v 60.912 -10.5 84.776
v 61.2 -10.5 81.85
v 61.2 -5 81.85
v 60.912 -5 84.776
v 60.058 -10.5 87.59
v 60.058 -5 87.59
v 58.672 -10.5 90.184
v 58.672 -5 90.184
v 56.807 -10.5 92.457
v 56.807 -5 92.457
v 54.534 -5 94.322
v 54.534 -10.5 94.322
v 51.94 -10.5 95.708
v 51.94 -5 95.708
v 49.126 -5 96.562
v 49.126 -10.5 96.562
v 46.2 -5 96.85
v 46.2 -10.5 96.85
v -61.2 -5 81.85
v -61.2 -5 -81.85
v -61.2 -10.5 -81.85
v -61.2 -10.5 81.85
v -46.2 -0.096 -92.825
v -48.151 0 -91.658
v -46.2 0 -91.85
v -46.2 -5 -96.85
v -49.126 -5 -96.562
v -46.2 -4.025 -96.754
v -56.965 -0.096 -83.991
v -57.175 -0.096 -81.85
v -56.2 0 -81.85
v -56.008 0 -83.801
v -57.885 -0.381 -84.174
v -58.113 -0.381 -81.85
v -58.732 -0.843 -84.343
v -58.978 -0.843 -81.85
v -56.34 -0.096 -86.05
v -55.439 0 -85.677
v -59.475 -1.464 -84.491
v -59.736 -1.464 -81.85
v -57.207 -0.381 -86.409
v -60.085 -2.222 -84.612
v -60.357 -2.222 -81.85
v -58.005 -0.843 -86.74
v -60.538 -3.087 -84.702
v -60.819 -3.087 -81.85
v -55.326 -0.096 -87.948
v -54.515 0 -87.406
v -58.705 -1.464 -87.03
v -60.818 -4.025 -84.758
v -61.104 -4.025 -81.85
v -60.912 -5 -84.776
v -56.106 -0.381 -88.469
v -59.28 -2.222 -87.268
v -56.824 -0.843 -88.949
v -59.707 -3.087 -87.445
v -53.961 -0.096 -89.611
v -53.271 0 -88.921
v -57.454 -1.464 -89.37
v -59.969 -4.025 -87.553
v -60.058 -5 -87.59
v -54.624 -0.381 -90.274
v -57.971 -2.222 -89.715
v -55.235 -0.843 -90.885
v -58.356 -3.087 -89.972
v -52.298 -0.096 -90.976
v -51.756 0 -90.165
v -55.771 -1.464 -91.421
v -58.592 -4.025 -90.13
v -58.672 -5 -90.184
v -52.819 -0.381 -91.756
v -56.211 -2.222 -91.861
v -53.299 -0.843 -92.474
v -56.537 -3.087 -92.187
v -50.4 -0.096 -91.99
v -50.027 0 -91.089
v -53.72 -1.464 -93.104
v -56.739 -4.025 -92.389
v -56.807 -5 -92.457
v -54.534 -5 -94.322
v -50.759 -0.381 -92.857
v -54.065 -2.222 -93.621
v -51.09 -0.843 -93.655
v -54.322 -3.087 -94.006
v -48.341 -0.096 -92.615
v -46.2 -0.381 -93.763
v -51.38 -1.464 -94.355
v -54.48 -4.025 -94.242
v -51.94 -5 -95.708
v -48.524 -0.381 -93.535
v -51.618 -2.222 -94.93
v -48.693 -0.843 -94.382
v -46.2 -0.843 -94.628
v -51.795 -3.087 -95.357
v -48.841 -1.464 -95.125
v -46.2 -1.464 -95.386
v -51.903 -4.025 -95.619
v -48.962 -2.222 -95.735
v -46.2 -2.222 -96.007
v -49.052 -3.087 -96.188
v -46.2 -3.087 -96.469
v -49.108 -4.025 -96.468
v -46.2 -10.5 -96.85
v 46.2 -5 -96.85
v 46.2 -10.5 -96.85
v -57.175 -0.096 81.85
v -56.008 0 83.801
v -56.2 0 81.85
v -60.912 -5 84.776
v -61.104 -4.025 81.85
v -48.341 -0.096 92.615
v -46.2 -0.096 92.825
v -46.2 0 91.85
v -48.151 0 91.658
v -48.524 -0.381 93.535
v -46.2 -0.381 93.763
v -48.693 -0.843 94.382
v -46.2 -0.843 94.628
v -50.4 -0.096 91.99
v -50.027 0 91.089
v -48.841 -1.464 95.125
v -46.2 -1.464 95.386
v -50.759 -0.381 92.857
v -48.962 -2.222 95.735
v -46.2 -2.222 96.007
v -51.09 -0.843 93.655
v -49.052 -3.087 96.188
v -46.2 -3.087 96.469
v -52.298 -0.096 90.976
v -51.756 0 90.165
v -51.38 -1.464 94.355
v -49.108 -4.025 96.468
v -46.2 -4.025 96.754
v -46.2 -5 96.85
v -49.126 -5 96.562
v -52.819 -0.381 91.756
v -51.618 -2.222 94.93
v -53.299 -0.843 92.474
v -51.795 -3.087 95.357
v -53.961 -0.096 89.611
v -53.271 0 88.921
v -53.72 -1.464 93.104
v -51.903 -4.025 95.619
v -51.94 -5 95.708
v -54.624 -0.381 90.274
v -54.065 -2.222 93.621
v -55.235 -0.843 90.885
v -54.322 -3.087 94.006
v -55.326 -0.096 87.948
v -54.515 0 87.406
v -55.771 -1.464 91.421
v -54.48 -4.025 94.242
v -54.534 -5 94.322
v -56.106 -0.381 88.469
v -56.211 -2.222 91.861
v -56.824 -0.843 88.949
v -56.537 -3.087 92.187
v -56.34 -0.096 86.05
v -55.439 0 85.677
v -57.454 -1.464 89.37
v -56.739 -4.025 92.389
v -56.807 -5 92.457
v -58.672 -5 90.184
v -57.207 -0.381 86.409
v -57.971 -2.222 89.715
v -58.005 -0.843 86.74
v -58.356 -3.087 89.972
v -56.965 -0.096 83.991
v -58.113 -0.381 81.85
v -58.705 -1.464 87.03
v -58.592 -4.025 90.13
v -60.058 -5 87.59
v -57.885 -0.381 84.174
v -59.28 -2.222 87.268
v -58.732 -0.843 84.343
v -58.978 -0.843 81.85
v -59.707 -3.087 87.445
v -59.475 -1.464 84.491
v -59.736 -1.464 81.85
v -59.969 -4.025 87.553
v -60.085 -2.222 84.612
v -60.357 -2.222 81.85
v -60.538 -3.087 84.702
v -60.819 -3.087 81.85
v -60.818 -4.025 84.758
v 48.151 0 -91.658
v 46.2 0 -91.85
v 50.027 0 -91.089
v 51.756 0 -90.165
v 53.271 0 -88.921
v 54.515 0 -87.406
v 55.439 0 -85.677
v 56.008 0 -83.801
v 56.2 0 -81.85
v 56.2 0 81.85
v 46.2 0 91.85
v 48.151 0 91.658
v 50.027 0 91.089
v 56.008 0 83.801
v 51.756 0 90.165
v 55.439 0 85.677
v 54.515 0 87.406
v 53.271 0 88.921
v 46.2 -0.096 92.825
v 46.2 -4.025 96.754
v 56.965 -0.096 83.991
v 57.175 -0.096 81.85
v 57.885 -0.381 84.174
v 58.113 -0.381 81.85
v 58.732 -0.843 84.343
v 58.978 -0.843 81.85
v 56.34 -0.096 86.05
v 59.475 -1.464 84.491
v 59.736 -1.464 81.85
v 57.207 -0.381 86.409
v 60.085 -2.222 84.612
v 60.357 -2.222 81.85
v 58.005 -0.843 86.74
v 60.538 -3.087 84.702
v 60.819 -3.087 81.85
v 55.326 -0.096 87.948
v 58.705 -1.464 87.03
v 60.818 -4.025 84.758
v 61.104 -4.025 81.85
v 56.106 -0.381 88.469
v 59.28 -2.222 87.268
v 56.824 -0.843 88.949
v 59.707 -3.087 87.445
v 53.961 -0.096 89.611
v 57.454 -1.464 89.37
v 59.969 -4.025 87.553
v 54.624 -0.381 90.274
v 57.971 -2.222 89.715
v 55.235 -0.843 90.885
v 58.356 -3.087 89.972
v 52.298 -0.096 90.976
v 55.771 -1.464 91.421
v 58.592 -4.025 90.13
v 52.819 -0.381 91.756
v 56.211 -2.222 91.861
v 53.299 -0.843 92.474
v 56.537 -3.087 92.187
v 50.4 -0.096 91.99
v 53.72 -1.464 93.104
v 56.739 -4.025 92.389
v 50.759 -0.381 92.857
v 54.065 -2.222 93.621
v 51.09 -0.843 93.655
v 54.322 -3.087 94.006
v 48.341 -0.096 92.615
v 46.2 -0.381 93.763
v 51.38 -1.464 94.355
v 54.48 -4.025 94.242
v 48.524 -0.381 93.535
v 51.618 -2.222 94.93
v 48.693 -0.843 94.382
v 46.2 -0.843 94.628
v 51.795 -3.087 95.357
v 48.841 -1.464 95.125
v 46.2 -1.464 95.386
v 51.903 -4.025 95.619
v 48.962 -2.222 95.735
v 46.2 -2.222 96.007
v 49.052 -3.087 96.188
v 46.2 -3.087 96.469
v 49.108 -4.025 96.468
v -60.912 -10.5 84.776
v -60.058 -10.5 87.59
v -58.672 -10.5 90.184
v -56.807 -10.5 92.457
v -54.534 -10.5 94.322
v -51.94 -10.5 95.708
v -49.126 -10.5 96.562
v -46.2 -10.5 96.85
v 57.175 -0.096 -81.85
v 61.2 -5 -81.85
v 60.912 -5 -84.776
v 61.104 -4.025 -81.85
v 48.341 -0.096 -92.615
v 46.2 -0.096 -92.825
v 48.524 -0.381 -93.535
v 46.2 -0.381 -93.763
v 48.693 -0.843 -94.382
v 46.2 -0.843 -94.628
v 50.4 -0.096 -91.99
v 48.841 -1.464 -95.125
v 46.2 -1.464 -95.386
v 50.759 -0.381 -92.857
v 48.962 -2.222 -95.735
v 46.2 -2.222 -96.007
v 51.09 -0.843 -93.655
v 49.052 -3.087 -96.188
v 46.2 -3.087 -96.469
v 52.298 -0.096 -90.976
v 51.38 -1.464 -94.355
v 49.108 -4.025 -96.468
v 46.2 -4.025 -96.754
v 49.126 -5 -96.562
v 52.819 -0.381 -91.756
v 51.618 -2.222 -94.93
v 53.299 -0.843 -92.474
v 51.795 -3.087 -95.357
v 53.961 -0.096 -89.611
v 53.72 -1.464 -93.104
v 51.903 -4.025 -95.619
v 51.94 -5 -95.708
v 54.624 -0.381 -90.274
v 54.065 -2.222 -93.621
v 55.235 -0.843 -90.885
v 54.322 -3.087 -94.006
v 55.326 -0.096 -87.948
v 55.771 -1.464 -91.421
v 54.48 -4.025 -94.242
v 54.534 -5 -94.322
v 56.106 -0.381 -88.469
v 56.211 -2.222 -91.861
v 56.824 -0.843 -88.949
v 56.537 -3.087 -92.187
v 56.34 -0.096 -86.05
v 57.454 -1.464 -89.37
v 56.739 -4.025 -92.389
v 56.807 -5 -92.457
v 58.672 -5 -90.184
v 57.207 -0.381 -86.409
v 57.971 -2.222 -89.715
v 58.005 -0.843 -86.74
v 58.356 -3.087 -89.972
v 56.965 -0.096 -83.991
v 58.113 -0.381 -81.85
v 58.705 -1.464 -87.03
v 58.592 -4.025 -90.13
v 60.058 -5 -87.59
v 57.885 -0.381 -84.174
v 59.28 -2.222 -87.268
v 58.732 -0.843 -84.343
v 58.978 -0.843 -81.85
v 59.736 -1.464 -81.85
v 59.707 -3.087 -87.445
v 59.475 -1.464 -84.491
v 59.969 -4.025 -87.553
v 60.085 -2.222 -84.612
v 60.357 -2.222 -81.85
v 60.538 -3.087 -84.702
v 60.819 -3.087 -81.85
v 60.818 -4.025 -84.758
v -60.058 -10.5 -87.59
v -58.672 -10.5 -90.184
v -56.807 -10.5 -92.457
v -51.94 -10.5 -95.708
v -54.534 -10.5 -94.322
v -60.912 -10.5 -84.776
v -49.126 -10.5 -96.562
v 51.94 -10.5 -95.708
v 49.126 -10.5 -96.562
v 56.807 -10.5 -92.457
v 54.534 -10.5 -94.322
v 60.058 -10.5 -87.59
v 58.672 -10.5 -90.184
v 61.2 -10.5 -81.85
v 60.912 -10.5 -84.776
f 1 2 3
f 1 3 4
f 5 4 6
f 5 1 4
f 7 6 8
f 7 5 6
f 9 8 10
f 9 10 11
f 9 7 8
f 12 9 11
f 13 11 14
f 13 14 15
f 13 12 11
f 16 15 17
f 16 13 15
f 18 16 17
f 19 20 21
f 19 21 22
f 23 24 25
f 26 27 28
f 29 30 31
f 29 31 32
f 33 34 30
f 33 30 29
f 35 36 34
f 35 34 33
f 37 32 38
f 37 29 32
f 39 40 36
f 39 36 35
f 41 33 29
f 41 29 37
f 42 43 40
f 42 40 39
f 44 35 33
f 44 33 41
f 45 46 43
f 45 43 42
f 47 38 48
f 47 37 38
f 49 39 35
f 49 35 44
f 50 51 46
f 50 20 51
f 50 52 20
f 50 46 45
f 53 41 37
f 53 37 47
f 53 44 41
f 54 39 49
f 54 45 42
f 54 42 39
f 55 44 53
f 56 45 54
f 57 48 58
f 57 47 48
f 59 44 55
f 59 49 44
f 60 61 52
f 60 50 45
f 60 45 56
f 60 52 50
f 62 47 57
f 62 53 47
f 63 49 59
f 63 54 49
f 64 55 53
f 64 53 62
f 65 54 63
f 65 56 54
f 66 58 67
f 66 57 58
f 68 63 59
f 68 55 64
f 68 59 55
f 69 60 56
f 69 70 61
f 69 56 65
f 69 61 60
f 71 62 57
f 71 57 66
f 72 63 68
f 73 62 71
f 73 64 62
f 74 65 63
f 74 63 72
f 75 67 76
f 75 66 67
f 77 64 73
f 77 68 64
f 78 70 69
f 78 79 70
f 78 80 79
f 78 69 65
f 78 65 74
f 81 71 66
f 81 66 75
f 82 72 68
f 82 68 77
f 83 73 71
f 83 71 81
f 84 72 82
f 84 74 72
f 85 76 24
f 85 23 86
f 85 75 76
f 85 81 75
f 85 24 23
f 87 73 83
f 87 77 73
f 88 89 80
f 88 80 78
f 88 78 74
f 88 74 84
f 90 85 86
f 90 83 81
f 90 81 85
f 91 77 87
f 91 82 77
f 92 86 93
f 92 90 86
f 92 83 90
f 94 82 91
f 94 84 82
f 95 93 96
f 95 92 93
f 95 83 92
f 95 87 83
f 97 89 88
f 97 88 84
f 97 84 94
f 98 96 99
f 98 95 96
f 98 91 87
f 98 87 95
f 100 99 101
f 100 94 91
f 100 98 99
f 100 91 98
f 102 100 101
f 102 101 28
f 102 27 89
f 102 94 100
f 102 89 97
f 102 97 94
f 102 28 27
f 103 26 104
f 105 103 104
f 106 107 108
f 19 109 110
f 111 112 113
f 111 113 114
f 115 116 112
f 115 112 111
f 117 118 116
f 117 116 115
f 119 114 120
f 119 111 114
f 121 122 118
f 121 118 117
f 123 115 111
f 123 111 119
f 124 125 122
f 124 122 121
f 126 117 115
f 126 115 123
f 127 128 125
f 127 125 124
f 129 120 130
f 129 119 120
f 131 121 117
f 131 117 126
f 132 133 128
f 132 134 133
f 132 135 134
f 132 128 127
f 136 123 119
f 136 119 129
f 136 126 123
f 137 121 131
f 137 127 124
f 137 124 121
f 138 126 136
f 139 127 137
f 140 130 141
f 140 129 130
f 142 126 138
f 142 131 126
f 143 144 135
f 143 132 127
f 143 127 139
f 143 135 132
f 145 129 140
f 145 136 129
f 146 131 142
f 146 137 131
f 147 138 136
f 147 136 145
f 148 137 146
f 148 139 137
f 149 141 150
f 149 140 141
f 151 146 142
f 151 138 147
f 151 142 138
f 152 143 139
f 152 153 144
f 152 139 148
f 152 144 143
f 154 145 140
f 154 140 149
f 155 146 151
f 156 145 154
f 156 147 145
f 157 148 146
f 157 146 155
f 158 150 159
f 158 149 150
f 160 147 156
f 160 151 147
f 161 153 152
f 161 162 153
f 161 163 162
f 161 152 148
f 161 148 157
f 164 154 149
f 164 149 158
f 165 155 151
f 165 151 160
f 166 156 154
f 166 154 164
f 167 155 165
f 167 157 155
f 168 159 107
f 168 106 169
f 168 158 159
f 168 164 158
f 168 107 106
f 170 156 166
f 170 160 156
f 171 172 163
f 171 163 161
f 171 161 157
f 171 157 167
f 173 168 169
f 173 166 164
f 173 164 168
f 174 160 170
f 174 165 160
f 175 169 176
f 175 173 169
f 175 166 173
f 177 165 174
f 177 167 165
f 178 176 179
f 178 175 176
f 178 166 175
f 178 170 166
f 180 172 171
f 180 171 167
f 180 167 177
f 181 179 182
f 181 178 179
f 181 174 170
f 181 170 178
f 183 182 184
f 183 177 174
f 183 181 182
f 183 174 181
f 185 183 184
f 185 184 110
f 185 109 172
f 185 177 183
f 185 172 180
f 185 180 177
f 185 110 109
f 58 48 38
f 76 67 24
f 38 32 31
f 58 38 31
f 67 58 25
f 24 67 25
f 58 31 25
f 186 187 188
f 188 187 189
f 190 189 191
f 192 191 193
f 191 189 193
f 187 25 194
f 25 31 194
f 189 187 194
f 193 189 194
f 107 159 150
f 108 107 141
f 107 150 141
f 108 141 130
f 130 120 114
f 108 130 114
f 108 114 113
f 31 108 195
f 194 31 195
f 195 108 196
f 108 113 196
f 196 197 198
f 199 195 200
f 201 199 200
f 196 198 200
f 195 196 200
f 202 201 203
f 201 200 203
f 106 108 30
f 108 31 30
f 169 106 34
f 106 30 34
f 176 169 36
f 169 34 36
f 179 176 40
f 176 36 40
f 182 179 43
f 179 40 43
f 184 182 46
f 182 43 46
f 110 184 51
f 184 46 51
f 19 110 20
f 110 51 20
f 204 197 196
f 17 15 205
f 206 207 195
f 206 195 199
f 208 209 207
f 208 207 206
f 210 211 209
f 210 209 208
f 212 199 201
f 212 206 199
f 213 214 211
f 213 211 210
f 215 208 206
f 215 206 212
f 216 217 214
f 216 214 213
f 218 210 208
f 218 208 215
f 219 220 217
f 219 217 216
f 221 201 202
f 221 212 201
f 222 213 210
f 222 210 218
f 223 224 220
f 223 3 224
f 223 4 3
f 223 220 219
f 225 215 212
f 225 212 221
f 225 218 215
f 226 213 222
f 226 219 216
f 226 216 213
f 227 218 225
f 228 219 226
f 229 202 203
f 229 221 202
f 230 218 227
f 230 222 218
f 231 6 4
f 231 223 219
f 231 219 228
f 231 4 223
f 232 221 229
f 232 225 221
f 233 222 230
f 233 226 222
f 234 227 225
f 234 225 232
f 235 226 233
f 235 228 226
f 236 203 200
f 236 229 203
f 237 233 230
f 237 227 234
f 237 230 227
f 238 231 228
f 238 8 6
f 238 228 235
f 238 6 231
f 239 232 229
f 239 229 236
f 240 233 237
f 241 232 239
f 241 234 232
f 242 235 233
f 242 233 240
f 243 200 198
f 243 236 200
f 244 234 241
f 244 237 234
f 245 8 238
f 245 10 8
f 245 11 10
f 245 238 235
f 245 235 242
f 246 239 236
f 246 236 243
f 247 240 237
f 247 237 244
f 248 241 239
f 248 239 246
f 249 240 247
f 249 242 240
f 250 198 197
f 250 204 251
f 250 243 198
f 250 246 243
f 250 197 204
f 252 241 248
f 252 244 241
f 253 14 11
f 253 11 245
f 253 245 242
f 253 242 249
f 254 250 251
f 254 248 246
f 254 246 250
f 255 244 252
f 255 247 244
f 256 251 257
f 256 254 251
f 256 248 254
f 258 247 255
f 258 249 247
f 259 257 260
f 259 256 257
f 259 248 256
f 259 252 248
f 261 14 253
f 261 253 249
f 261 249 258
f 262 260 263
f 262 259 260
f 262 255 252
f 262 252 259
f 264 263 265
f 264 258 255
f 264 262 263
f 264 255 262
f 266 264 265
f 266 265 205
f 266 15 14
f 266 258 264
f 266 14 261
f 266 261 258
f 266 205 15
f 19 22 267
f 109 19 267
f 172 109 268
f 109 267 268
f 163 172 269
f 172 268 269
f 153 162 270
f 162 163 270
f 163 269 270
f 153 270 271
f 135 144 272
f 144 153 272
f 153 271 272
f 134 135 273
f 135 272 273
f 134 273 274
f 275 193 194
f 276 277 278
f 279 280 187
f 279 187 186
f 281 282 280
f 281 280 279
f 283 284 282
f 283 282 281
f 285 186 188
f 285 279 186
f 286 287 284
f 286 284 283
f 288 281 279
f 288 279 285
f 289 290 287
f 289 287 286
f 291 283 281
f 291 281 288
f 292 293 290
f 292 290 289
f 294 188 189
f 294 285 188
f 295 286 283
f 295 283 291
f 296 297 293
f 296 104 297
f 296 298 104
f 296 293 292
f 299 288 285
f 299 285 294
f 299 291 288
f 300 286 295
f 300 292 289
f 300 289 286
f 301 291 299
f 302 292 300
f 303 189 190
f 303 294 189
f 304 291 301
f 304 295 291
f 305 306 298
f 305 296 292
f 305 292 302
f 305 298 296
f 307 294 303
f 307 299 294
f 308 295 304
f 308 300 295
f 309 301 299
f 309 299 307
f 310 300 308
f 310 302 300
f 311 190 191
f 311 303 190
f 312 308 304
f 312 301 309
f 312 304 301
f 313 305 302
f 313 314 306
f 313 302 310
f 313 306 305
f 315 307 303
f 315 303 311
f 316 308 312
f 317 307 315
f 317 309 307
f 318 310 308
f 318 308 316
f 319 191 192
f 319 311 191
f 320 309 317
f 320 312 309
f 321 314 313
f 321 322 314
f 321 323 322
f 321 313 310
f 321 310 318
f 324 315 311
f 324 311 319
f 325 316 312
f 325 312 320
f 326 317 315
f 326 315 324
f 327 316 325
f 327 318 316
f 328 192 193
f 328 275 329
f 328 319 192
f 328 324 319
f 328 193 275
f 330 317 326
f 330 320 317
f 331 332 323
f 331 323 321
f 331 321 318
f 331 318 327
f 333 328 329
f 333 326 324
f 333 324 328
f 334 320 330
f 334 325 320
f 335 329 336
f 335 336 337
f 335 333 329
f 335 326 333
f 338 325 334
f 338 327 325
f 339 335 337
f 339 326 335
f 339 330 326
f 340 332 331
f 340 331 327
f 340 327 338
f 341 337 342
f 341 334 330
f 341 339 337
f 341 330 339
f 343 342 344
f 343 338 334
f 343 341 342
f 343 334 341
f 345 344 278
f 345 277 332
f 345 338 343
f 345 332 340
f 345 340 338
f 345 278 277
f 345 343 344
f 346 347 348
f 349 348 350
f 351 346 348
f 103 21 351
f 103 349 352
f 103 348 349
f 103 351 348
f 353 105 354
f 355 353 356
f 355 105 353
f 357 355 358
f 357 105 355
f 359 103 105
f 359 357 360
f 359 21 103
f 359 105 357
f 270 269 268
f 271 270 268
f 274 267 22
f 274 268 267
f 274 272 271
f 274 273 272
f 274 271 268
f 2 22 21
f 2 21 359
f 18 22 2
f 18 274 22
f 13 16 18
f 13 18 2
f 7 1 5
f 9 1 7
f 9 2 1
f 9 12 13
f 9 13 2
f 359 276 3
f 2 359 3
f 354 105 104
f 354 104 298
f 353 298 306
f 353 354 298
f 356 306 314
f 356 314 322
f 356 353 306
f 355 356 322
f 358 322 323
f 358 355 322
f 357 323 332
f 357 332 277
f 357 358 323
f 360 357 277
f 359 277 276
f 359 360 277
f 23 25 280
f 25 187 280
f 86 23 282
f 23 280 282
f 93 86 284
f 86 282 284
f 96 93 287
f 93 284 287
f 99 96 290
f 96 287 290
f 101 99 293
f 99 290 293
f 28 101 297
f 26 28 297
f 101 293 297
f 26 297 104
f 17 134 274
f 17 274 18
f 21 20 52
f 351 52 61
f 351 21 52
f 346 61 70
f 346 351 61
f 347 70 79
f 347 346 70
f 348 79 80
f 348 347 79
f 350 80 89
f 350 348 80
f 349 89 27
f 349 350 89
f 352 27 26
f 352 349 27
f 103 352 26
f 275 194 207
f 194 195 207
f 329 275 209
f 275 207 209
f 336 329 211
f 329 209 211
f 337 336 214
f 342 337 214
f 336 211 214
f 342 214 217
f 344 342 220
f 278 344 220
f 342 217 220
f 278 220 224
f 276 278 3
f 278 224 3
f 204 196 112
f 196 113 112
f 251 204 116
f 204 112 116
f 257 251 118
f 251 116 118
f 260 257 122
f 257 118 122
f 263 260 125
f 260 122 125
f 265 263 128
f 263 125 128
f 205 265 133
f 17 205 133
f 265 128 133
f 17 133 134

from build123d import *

# Parameters (mm, degrees)
F0_W     = 122.4
F0_H     = 193.7
F1_DEPTH = 10.5
F2_R     = 15
F3_R     = 5


with BuildPart() as f1:
    # F0 (on Front) → F1 (new body)
    with BuildSketch(Plane.XZ):
        Rectangle(F0_W, F0_H)
    extrude(amount=F1_DEPTH)

    # F2
    f2_edges = [f1.edges().sort_by_distance(p)[0] for p in [
        (61.2, -5.25, 96.85),
        (61.2, -5.25, -96.85),
        (-61.2, -5.25, 96.85),
        (-61.2, -5.25, -96.85),
    ]]
    fillet(f2_edges, radius=F2_R)

    # F3
    f3_edges = [f1.edges().sort_by_distance(p)[0] for p in [
        (61.2, 0, 0),
    ]]
    fillet(f3_edges, radius=F3_R)


solid = f1.part
